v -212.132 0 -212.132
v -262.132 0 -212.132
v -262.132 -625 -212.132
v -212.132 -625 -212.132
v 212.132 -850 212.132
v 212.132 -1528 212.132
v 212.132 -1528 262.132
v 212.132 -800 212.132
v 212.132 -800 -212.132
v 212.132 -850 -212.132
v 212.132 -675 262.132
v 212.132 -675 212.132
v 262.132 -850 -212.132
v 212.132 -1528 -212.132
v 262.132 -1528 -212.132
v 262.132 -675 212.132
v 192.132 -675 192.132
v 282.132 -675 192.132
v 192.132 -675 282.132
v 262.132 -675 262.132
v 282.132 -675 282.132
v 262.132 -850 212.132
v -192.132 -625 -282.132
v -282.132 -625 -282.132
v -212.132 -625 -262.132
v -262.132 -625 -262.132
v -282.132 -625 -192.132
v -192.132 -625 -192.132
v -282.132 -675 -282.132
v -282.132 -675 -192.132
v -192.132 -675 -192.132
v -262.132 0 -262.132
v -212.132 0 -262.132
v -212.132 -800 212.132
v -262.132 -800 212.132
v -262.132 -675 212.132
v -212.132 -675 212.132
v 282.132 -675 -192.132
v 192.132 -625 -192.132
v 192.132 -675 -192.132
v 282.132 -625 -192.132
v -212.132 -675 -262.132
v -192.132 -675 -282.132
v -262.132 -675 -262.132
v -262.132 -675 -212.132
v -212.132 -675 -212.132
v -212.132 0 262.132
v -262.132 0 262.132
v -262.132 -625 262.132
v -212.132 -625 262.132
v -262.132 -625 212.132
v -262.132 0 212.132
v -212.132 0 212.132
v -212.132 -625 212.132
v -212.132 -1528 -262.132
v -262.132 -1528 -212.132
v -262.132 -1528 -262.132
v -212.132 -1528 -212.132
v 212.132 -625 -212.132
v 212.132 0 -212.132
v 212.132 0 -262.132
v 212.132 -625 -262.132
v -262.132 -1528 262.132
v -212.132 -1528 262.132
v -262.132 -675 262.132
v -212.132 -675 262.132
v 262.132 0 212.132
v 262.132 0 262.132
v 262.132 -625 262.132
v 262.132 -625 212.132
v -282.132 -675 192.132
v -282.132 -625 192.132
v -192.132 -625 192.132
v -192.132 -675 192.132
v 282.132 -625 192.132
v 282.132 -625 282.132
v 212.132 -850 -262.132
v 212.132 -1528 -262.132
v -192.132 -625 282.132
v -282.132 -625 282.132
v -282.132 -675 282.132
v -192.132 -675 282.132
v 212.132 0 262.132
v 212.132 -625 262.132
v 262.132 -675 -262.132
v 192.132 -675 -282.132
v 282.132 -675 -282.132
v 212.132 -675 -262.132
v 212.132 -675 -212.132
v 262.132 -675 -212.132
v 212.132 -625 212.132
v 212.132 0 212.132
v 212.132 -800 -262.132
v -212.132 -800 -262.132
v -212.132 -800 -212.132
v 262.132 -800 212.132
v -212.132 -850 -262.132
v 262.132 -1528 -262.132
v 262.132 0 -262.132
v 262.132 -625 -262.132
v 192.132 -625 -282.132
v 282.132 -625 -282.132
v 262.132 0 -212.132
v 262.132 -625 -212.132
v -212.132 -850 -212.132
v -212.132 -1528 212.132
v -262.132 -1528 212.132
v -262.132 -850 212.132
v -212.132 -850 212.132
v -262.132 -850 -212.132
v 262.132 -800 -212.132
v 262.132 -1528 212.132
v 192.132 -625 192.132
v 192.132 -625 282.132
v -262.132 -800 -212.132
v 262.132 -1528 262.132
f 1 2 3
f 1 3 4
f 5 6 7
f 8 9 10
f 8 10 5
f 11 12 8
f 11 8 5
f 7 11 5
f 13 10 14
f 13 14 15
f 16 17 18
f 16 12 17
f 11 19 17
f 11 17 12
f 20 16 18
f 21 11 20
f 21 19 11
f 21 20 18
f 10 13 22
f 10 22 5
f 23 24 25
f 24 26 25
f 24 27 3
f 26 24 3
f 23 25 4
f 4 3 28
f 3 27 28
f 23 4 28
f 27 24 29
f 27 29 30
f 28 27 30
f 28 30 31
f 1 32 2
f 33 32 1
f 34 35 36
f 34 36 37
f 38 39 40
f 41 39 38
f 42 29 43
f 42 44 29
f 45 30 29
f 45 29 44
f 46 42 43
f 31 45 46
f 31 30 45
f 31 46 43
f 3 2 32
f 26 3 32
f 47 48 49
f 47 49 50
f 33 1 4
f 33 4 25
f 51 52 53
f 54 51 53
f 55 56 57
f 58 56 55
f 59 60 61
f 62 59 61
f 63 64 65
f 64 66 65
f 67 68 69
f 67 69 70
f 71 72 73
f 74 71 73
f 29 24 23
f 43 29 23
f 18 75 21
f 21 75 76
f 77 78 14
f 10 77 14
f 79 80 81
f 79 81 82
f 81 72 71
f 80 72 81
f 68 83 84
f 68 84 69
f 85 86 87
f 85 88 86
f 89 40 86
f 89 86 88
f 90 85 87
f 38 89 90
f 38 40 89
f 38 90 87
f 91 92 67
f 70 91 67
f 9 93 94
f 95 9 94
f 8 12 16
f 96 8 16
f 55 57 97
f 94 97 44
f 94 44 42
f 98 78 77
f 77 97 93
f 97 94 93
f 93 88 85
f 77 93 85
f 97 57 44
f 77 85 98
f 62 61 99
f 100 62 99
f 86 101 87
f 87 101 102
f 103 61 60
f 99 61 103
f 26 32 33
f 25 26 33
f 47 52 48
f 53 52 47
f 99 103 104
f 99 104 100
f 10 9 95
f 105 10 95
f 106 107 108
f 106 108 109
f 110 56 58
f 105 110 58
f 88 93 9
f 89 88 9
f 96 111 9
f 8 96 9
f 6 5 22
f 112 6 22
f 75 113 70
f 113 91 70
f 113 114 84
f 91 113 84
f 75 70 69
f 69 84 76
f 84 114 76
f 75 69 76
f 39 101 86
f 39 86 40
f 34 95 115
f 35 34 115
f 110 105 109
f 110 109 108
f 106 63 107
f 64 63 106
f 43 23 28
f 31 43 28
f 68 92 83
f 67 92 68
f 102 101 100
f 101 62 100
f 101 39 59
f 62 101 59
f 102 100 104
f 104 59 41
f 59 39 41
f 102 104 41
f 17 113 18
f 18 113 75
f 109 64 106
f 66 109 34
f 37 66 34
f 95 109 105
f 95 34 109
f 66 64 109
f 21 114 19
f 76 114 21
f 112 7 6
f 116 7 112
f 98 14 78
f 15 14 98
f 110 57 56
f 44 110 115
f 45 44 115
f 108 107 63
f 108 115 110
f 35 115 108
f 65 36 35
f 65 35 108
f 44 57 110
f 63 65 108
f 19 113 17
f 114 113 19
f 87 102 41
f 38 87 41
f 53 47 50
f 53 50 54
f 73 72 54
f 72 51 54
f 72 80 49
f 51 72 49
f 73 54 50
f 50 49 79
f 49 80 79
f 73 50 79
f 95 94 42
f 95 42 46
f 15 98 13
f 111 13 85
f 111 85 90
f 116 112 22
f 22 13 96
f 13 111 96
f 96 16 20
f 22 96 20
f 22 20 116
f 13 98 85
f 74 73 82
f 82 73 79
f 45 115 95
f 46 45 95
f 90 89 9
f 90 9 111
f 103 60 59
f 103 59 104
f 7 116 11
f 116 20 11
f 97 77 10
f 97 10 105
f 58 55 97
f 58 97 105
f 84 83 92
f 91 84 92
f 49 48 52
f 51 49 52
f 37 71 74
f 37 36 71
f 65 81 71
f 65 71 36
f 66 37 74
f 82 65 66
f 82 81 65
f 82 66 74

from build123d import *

# Parameters (mm, degrees)
CROQUIS1_W                = 50
CROQUIS1_H                = 50
SALIENTE_EXTRUIR1_DEPTH   = 625
SALIENTE_EXTRUIR1_2_DEPTH = 625
SALIENTE_EXTRUIR1_3_DEPTH = 625
SALIENTE_EXTRUIR1_4_DEPTH = 625
CROQUIS2_W                = 90
CROQUIS2_H                = 90
SALIENTE_EXTRUIR2_DEPTH   = 50
CROQUIS4_W                = 50
CROQUIS4_H                = 50
SALIENTE_EXTRUIR3_DEPTH   = 853
SALIENTE_EXTRUIR4_DEPTH   = 50


with BuildPart() as part:
    # Croquis1 → Saliente-Extruir1 (new body)
    with BuildSketch(Plane(origin=(0, 0, 0), x_dir=(1, 0, 0), z_dir=(0, 1, 0))):
        with Locations((-237.132034356, 237.132034356)):
            Rectangle(CROQUIS1_W, CROQUIS1_H)
    extrude(amount=-SALIENTE_EXTRUIR1_DEPTH)



with BuildPart() as body_2:
    # Croquis1 → Saliente-Extruir1 2 (new body)
    with BuildSketch(Plane(origin=(0, 0, 0), x_dir=(1, 0, 0), z_dir=(0, 1, 0))):
        with Locations((237.132034356, 237.132034356)):
            Rectangle(CROQUIS1_W, CROQUIS1_H)
    extrude(amount=-SALIENTE_EXTRUIR1_2_DEPTH)


with BuildPart() as body_3:
    # Croquis1 → Saliente-Extruir1 3 (new body)
    with BuildSketch(Plane(origin=(0, 0, 0), x_dir=(1, 0, 0), z_dir=(0, 1, 0))):
        with Locations((-237.132034356, -237.132034356)):
            Rectangle(CROQUIS1_W, CROQUIS1_H)
    extrude(amount=-SALIENTE_EXTRUIR1_3_DEPTH)


with BuildPart() as body_4:
    # Croquis1 → Saliente-Extruir1 4 (new body)
    with BuildSketch(Plane(origin=(0, 0, 0), x_dir=(1, 0, 0), z_dir=(0, 1, 0))):
        with Locations((237.132034356, -237.132034356)):
            Rectangle(CROQUIS1_W, CROQUIS1_H)
    extrude(amount=-SALIENTE_EXTRUIR1_4_DEPTH)


with BuildPart() as part_1:
    add(part.part)

    add(body_2.part)  # Saliente-Extruir2 merges body 2

    add(body_3.part)  # Saliente-Extruir2 merges body 3

    add(body_4.part)  # Saliente-Extruir2 merges body 4
    # Croquis2 → Saliente-Extruir2 (add)
    with BuildSketch(Plane.XZ.offset(625)):
        with Locations((-237.132034356, 237.132034356)):
            Rectangle(CROQUIS2_W, CROQUIS2_H)
        with Locations((237.132034356, 237.132034356)):
            Rectangle(CROQUIS2_W, CROQUIS2_H)
        with Locations((237.132034356, -237.132034356)):
            Rectangle(CROQUIS2_W, CROQUIS2_H)
        with Locations((-237.132034356, -237.132034356)):
            Rectangle(CROQUIS2_W, CROQUIS2_H)
    extrude(amount=SALIENTE_EXTRUIR2_DEPTH)

    # Croquis4 → Saliente-Extruir3 (add)
    with BuildSketch(Plane.XZ.offset(675)):
        with Locations((-237.132034356, 237.132034356)):
            Rectangle(CROQUIS4_W, CROQUIS4_H)
        with Locations((-237.132034356, -237.132034356)):
            Rectangle(CROQUIS4_W, CROQUIS4_H)
        with Locations((237.132034356, 237.132034356)):
            Rectangle(CROQUIS4_W, CROQUIS4_H)
        with Locations((237.132034356, -237.132034356)):
            Rectangle(CROQUIS4_W, CROQUIS4_H)
    extrude(amount=SALIENTE_EXTRUIR3_DEPTH)

    # Croquis6 → Saliente-Extruir4 (add)
    with BuildSketch(Plane(origin=(0, -800, 0), x_dir=(1, 0, 0), z_dir=(0, 1, 0))):
        Polygon((-262.132034356, 262.132034356), (262.132034356, 262.132034356), (262.132034356, -262.132034356), (212.132034356, -262.132034356), (212.132034356, -212.132034356), (212.132034356, 212.132034356), (-212.132034356, 212.132034356), (-212.132034356, -212.132034356), (-212.132034356, -262.132034356), (-262.132034356, -262.132034356), align=None)
    extrude(amount=-SALIENTE_EXTRUIR4_DEPTH)


solid = part_1.part
